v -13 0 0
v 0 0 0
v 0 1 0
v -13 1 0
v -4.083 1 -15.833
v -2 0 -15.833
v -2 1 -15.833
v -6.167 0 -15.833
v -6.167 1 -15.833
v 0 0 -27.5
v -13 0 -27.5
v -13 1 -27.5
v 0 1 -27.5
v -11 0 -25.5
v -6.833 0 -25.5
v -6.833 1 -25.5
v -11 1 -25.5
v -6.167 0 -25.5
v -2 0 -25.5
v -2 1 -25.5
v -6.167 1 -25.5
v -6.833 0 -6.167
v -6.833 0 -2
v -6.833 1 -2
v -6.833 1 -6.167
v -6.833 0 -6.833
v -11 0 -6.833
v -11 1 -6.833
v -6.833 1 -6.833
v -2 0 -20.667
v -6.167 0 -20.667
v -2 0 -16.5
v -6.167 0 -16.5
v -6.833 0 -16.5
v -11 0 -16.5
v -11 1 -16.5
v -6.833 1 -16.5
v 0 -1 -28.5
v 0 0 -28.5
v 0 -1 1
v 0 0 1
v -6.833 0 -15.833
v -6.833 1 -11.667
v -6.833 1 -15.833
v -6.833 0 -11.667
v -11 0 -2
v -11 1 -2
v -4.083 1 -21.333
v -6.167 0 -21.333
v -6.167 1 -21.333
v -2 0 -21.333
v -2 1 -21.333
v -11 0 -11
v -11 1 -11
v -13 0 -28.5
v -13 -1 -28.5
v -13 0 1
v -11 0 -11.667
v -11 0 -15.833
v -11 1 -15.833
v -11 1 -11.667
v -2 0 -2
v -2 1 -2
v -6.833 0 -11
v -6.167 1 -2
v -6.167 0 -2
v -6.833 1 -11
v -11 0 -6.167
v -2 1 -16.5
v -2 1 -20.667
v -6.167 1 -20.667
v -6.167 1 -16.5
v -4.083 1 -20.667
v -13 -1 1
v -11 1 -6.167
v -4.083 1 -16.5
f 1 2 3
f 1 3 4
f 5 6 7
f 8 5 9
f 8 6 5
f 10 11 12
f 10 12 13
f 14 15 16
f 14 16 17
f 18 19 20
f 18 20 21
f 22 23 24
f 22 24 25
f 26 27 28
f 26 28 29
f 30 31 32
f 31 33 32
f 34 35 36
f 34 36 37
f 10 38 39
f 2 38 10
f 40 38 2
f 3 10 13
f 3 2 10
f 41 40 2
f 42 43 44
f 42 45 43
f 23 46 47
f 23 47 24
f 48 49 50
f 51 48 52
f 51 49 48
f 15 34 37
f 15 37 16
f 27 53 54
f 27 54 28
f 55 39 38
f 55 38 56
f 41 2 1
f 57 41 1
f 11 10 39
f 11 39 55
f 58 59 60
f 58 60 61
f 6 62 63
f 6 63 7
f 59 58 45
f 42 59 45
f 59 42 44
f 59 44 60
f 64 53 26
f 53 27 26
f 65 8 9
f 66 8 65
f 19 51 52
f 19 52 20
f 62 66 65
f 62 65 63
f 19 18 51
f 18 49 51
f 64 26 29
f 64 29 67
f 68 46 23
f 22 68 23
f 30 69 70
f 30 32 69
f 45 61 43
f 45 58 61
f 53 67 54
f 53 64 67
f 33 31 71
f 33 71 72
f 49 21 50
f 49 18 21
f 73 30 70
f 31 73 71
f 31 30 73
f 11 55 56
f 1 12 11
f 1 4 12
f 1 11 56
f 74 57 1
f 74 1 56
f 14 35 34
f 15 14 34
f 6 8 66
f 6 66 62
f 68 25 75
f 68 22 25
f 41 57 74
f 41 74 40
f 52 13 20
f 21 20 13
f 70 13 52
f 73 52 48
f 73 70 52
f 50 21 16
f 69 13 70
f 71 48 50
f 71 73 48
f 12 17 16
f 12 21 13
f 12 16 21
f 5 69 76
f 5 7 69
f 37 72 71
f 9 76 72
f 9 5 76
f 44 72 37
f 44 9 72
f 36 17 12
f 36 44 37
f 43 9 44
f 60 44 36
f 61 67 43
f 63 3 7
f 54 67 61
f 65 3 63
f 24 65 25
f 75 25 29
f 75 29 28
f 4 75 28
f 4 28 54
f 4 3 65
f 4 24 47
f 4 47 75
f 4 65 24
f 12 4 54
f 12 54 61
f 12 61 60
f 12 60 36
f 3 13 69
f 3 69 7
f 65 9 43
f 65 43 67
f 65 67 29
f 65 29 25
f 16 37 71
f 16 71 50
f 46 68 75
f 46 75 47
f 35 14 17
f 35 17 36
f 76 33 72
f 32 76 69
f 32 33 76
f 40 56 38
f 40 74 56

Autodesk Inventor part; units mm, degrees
ref_plane "YZ Plane" through (0, 0, 0) normal (1, 0, 0) x (0, 1, 0)
ref_plane "XZ Plane" through (0, 0, 0) normal (0, 1, 0) x (-1, 0, 0)
ref_plane "XY Plane" through (0, 0, 0) normal (0, 0, 1) x (1, 0, 0)
sketch "Эскиз1" plane through (0, 0, 0) normal (0, 1, 0) x (-1, 0, 0)
  line L0 (0, 0) -> (13, 0)
  line L1 (13, 0) -> (13, -27.5)
  line L2 (13, -27.5) -> (0, -27.5)
  line L3 (0, -27.5) -> (0, 0)
  line L4 (11, -2) -> (6.8333, -2)
  line L5 (6.8333, -2) -> (6.8333, -6.1667)
  line L6 (6.8333, -6.1667) -> (11, -6.1667)
  line L7 (11, -6.1667) -> (11, -2)
  line L8 (11, -6.8333) -> (6.8333, -6.8333)
  line L9 (6.8333, -6.8333) -> (6.8333, -11)
  line L10 (6.8333, -11) -> (11, -11)
  line L11 (11, -11) -> (11, -6.8333)
  line L12 (11, -11.6667) -> (6.8333, -11.6667)
  line L13 (6.8333, -11.6667) -> (6.8333, -15.8333)
  line L14 (6.8333, -15.8333) -> (11, -15.8333)
  line L15 (11, -15.8333) -> (11, -11.6667)
  line L16 (11, -16.5) -> (6.8333, -16.5)
  line L17 (6.8333, -16.5) -> (6.8333, -25.5)
  line L18 (6.8333, -25.5) -> (11, -25.5)
  line L19 (11, -25.5) -> (11, -16.5)
  line L20 (6.1667, -16.5) -> (2, -16.5)
  line L21 (2, -16.5) -> (2, -20.6667)
  line L22 (2, -20.6667) -> (6.1667, -20.6667)
  line L23 (6.1667, -20.6667) -> (6.1667, -16.5)
  line L24 (6.1667, -21.3333) -> (2, -21.3333)
  line L25 (2, -21.3333) -> (2, -25.5)
  line L26 (2, -25.5) -> (6.1667, -25.5)
  line L27 (6.1667, -25.5) -> (6.1667, -21.3333)
  line L28 (6.1667, -2) -> (2, -2)
  line L29 (2, -2) -> (2, -15.8333)
  line L30 (2, -15.8333) -> (6.1667, -15.8333)
  line L31 (6.1667, -15.8333) -> (6.1667, -2)
  line L32 (8.9167, -6.1667) -> (8.9167, -6.8333)
  line L33 (8.9167, -11) -> (8.9167, -11.6667)
  line L34 (8.9167, -15.8333) -> (8.9167, -16.5)
  line L35 (4.0833, -15.8333) -> (4.0833, -16.5)
  line L36 (4.0833, -20.6667) -> (4.0833, -21.3333)
  line L37 (8.9167, -2) -> (8.9167, 0)
  line L38 (8.9167, -25.5) -> (8.9167, -27.5)
  line L39 (11, -8.9167) -> (13, -8.9167)
  line L40 (2, -8.9167) -> (0, -8.9167)
  line L41 (6.8333, -8.9167) -> (6.1667, -8.9167)
  dimension "d0" = 13
  dimension "d1" = 27.5
  dimension "d9" = 2
extrude "Выдавливание1" add sketch "Эскиз1" along normal blind 1 contours L0 L37 L4 L5 L6 L32 L8 L9 L41 L31 L28 L29 L40 L3 | L0 L1 L39 L11 L8 L32 L6 L7 L4 L37 | L40 L29 L30 L31 L41 L9 L10 L33 L12 L13 L14 L34 L16 L17 L18 L38 L2 L3 | L1 L2 L38 L18 L19 L16 L34 L14 L15 L12 L33 L10 L11 L39
sketch "Эскиз2" plane through (0, 0, 0) normal (0, -1, 0) x (1, 0, 0)
  line L0 (0, 0) -> (0, -27.5) projected
  line L1 (-13, 0) -> (0, 0) projected
  line L2 (-13, -27.5) -> (-13, 0) projected
  line L3 (0, -27.5) -> (-13, -27.5) projected
  line L4 (-6.1667, -15.8333) -> (-2, -15.8333) projected
  line L5 (-6.1667, -2) -> (-6.1667, -15.8333) projected
  line L6 (-2, -2) -> (-6.1667, -2) projected
  line L7 (-2, -15.8333) -> (-2, -2) projected
  line L8 (-2, -25.5) -> (-2, -21.3333) projected
  line L9 (-6.1667, -25.5) -> (-2, -25.5) projected
  line L10 (-6.1667, -21.3333) -> (-6.1667, -25.5) projected
  line L11 (-2, -21.3333) -> (-6.1667, -21.3333) projected
  line L12 (-6.8333, -11.6667) -> (-11, -11.6667) projected
  line L13 (-6.8333, -15.8333) -> (-6.8333, -11.6667) projected
  line L14 (-11, -15.8333) -> (-6.8333, -15.8333) projected
  line L15 (-11, -11.6667) -> (-11, -15.8333) projected
  line L16 (-11, -16.5) -> (-11, -25.5) projected
  line L17 (-6.8333, -16.5) -> (-11, -16.5) projected
  line L18 (-6.8333, -25.5) -> (-6.8333, -16.5) projected
  line L19 (-11, -25.5) -> (-6.8333, -25.5) projected
  line L20 (-11, -11) -> (-6.8333, -11) projected
  line L21 (-11, -6.8333) -> (-11, -11) projected
  line L22 (-6.8333, -6.8333) -> (-11, -6.8333) projected
  line L23 (-6.8333, -11) -> (-6.8333, -6.8333) projected
  line L24 (-11, -2) -> (-11, -6.1667) projected
  line L25 (-6.8333, -2) -> (-11, -2) projected
  line L26 (-6.8333, -6.1667) -> (-6.8333, -2) projected
  line L27 (-11, -6.1667) -> (-6.8333, -6.1667) projected
  line L28 (-2, -20.6667) -> (-2, -16.5) projected
  line L29 (-6.1667, -20.6667) -> (-2, -20.6667) projected
  line L30 (-6.1667, -16.5) -> (-6.1667, -20.6667) projected
  line L31 (-2, -16.5) -> (-6.1667, -16.5) projected
extrude "Выдавливание2" add sketch "Эскиз2" along normal blind 1 contours L0 L3 L2 L1 | L5 L6 L7 L4 | L9 L10 L11 L8 | L13 L14 L15 L12 | L17 L18 L19 L16 | L21 L22 L23 L20 | L25 L26 L27 L24 | L29 L30 L31 L28
sketch "Эскиз3" plane through (-13, 1, 0) normal (0, 0, 1) x (1, 0, 0)
  line L0 (0, -2) -> (13, -2)
  line L1 (13, -2) -> (13, -1)
  line L2 (13, -1) -> (0, -1)
  line L3 (0, -1) -> (0, -2)
  line L4 (13, -2) -> (13, 0) projected
  line L5 (0, -2) -> (0, 0) projected
  line L6 (13, -2) -> (0, -2) projected
  dimension "d14" = 1
extrude "Выдавливание3" add sketch "Эскиз3" along normal blind 1
sketch "Эскиз4" plane through (0, 1, -27.5) normal (0, 0, -1) x (-1, 0, 0)
  line L0 (6.8333, -1) -> (11, -1) projected
  line L1 (13, -2) -> (0, -2) projected
  line L2 (0, -2) -> (0, -1) projected
  line L3 (0, -1) -> (13, -1) projected
  line L4 (13, -1) -> (13, -2) projected
extrude "Выдавливание4" add sketch "Эскиз4" along normal blind 1
properties part number "Лого ШП"
